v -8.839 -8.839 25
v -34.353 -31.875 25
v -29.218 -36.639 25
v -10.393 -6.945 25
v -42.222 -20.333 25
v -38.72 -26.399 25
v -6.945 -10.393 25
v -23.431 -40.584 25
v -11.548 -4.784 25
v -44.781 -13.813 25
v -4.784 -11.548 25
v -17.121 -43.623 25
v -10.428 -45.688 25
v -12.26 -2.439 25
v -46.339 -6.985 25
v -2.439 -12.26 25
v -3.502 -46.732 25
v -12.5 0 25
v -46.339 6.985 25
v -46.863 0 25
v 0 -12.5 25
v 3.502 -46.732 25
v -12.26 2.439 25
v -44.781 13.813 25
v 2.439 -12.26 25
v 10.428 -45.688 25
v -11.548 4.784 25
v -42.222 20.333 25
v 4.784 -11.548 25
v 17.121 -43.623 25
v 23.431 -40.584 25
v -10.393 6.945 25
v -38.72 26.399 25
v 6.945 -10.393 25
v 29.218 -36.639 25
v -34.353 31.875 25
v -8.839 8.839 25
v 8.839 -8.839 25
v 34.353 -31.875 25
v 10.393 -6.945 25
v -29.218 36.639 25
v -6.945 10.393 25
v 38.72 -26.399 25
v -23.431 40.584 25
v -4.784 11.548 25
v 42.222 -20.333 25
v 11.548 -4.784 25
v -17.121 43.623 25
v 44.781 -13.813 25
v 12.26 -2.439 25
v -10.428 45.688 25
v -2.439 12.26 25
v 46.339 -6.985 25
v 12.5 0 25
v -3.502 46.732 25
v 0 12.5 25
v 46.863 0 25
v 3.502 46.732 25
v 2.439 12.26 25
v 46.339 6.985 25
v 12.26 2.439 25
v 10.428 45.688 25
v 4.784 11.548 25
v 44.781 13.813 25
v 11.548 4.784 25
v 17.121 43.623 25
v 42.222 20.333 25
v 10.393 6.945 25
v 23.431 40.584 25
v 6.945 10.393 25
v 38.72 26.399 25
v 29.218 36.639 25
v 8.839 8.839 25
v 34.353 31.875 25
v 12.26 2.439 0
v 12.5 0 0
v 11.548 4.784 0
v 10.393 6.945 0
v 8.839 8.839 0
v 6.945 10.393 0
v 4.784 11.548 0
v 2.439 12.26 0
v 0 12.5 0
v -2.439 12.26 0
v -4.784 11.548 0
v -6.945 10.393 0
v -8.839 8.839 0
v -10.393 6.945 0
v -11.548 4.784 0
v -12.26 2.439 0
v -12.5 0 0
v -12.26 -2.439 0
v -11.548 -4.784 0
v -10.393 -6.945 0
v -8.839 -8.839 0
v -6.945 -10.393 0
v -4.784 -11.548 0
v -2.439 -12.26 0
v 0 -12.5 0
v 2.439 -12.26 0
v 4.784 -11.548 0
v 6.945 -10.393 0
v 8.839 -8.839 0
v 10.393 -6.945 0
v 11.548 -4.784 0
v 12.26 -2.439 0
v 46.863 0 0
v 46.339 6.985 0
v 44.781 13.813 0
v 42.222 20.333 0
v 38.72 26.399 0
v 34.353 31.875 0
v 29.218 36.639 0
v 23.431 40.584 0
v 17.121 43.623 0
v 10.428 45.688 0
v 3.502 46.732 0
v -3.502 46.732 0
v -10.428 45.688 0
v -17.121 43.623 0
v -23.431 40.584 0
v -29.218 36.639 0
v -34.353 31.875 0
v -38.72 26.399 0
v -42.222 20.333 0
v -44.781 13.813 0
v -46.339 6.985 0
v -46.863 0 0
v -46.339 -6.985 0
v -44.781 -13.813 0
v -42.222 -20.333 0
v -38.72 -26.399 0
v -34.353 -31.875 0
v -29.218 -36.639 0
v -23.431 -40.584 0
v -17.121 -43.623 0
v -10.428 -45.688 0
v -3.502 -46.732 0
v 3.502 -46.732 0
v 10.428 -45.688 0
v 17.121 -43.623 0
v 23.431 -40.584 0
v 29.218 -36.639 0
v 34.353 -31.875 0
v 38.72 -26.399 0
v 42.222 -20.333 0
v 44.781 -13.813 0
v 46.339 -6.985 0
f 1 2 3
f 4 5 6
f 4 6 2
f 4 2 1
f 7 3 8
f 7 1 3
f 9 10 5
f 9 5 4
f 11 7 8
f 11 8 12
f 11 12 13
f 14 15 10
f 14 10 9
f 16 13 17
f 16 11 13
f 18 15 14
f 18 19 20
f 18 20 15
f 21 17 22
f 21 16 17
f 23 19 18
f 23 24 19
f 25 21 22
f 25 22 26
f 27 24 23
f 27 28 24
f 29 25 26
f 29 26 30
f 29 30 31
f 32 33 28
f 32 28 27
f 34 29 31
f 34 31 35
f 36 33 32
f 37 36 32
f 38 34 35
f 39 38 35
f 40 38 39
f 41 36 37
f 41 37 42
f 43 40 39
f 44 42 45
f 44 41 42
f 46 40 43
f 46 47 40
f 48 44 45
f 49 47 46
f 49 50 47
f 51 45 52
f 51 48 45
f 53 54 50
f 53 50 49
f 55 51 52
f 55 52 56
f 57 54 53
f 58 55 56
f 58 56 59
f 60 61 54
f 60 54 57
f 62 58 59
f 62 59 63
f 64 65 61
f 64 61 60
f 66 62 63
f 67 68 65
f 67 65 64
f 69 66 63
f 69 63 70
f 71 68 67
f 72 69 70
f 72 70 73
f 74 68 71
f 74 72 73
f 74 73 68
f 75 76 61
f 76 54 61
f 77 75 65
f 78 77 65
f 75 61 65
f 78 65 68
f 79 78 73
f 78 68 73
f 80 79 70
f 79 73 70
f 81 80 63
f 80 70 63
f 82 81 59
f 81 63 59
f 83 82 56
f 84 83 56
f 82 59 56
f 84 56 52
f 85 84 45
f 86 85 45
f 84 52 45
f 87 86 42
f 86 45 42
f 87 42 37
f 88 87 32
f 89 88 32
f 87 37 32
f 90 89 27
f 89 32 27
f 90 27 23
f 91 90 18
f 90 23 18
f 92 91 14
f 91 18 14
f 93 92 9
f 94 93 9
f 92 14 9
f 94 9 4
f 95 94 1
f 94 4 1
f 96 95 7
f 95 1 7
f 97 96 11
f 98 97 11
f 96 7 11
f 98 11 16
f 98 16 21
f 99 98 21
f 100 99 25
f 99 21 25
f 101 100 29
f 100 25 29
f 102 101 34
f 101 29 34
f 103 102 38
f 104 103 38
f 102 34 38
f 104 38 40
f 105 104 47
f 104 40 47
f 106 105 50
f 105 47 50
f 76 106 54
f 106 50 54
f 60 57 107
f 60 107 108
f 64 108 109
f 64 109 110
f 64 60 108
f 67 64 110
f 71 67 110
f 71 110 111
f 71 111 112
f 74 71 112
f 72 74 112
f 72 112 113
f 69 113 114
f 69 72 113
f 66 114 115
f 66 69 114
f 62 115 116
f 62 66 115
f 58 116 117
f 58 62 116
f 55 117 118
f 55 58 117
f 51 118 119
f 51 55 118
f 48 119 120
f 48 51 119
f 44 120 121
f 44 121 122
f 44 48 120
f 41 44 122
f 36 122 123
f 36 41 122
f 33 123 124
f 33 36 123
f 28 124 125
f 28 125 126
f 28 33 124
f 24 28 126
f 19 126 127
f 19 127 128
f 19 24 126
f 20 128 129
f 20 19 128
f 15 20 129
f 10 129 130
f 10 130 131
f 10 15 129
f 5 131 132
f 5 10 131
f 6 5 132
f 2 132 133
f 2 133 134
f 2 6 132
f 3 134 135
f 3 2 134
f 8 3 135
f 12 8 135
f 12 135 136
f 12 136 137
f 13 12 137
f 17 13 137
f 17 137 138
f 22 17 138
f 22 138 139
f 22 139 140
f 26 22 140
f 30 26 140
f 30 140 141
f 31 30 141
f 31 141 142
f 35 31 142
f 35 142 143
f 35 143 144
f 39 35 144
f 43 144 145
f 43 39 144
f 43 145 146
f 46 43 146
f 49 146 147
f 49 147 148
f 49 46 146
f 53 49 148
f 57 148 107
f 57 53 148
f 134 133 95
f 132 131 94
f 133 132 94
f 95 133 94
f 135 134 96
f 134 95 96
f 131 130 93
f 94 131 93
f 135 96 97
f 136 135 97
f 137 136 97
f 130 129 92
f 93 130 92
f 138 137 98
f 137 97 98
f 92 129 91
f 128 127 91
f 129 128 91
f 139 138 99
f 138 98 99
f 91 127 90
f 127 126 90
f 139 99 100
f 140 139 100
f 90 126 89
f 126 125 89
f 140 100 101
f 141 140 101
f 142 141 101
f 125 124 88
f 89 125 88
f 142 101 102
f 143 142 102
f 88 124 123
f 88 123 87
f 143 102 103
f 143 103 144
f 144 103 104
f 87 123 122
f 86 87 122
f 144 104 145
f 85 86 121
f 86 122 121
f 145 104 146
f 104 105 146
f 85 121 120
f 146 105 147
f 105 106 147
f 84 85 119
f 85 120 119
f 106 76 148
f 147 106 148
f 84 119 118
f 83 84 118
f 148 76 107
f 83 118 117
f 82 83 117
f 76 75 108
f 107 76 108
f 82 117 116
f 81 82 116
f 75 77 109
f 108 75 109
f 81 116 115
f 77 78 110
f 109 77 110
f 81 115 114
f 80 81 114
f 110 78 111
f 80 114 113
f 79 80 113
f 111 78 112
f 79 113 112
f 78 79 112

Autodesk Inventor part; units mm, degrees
ref_plane "YZ Plane" through (0, 0, 0) normal (1, 0, 0) x (0, 1, 0)
ref_plane "XZ Plane" through (0, 0, 0) normal (0, 1, 0) x (-1, 0, 0)
ref_plane "XY Plane" through (0, 0, 0) normal (0, 0, 1) x (1, 0, 0)
sketch "Sketch1" plane through (0, 0, 0) normal (0, 0, 1) x (1, 0, 0)
  circle A0 centre (0, 0) radius 75
  dimension "d0" = 150
extrude "Extrusion1" add sketch "Sketch1" along normal blind 25
fillet "Fillet1" radius 10 2 edges at (-75, 0, 25) (-75, 0, 0)
sketch "Sketch2" plane through (0, 0, 25) normal (0, 0, 1) x (1, 0, 0)
  circle A0 centre (0, 0) radius 12.5
  dimension "d4" = 25
extrude "Extrusion2" cut sketch "Sketch2" against normal blind 25
sketch "Sketch3" plane through (0, 0, 25) normal (0, 0, 1) x (1, 0, 0)
  point P0 (0, 0)
sketch "Sketch4" plane through (0, 0, 25) normal (0, 0, 1) x (1, 0, 0)
  circle A0 centre (0, 0) radius 46.8628
extrude "Extrusion3" cut sketch "Sketch4" against normal blind 25 keep common part
sketch "Sketch5" plane through (0, 0, 0) normal (0, 0, -1) x (-1, 0, 0)
  point P0 (0, 0)
sketch "Sketch6" plane through (0, 0, 25) normal (0, 0, 1) x (1, 0, 0)
  point P0 (0, 0)
properties part number "roller"
